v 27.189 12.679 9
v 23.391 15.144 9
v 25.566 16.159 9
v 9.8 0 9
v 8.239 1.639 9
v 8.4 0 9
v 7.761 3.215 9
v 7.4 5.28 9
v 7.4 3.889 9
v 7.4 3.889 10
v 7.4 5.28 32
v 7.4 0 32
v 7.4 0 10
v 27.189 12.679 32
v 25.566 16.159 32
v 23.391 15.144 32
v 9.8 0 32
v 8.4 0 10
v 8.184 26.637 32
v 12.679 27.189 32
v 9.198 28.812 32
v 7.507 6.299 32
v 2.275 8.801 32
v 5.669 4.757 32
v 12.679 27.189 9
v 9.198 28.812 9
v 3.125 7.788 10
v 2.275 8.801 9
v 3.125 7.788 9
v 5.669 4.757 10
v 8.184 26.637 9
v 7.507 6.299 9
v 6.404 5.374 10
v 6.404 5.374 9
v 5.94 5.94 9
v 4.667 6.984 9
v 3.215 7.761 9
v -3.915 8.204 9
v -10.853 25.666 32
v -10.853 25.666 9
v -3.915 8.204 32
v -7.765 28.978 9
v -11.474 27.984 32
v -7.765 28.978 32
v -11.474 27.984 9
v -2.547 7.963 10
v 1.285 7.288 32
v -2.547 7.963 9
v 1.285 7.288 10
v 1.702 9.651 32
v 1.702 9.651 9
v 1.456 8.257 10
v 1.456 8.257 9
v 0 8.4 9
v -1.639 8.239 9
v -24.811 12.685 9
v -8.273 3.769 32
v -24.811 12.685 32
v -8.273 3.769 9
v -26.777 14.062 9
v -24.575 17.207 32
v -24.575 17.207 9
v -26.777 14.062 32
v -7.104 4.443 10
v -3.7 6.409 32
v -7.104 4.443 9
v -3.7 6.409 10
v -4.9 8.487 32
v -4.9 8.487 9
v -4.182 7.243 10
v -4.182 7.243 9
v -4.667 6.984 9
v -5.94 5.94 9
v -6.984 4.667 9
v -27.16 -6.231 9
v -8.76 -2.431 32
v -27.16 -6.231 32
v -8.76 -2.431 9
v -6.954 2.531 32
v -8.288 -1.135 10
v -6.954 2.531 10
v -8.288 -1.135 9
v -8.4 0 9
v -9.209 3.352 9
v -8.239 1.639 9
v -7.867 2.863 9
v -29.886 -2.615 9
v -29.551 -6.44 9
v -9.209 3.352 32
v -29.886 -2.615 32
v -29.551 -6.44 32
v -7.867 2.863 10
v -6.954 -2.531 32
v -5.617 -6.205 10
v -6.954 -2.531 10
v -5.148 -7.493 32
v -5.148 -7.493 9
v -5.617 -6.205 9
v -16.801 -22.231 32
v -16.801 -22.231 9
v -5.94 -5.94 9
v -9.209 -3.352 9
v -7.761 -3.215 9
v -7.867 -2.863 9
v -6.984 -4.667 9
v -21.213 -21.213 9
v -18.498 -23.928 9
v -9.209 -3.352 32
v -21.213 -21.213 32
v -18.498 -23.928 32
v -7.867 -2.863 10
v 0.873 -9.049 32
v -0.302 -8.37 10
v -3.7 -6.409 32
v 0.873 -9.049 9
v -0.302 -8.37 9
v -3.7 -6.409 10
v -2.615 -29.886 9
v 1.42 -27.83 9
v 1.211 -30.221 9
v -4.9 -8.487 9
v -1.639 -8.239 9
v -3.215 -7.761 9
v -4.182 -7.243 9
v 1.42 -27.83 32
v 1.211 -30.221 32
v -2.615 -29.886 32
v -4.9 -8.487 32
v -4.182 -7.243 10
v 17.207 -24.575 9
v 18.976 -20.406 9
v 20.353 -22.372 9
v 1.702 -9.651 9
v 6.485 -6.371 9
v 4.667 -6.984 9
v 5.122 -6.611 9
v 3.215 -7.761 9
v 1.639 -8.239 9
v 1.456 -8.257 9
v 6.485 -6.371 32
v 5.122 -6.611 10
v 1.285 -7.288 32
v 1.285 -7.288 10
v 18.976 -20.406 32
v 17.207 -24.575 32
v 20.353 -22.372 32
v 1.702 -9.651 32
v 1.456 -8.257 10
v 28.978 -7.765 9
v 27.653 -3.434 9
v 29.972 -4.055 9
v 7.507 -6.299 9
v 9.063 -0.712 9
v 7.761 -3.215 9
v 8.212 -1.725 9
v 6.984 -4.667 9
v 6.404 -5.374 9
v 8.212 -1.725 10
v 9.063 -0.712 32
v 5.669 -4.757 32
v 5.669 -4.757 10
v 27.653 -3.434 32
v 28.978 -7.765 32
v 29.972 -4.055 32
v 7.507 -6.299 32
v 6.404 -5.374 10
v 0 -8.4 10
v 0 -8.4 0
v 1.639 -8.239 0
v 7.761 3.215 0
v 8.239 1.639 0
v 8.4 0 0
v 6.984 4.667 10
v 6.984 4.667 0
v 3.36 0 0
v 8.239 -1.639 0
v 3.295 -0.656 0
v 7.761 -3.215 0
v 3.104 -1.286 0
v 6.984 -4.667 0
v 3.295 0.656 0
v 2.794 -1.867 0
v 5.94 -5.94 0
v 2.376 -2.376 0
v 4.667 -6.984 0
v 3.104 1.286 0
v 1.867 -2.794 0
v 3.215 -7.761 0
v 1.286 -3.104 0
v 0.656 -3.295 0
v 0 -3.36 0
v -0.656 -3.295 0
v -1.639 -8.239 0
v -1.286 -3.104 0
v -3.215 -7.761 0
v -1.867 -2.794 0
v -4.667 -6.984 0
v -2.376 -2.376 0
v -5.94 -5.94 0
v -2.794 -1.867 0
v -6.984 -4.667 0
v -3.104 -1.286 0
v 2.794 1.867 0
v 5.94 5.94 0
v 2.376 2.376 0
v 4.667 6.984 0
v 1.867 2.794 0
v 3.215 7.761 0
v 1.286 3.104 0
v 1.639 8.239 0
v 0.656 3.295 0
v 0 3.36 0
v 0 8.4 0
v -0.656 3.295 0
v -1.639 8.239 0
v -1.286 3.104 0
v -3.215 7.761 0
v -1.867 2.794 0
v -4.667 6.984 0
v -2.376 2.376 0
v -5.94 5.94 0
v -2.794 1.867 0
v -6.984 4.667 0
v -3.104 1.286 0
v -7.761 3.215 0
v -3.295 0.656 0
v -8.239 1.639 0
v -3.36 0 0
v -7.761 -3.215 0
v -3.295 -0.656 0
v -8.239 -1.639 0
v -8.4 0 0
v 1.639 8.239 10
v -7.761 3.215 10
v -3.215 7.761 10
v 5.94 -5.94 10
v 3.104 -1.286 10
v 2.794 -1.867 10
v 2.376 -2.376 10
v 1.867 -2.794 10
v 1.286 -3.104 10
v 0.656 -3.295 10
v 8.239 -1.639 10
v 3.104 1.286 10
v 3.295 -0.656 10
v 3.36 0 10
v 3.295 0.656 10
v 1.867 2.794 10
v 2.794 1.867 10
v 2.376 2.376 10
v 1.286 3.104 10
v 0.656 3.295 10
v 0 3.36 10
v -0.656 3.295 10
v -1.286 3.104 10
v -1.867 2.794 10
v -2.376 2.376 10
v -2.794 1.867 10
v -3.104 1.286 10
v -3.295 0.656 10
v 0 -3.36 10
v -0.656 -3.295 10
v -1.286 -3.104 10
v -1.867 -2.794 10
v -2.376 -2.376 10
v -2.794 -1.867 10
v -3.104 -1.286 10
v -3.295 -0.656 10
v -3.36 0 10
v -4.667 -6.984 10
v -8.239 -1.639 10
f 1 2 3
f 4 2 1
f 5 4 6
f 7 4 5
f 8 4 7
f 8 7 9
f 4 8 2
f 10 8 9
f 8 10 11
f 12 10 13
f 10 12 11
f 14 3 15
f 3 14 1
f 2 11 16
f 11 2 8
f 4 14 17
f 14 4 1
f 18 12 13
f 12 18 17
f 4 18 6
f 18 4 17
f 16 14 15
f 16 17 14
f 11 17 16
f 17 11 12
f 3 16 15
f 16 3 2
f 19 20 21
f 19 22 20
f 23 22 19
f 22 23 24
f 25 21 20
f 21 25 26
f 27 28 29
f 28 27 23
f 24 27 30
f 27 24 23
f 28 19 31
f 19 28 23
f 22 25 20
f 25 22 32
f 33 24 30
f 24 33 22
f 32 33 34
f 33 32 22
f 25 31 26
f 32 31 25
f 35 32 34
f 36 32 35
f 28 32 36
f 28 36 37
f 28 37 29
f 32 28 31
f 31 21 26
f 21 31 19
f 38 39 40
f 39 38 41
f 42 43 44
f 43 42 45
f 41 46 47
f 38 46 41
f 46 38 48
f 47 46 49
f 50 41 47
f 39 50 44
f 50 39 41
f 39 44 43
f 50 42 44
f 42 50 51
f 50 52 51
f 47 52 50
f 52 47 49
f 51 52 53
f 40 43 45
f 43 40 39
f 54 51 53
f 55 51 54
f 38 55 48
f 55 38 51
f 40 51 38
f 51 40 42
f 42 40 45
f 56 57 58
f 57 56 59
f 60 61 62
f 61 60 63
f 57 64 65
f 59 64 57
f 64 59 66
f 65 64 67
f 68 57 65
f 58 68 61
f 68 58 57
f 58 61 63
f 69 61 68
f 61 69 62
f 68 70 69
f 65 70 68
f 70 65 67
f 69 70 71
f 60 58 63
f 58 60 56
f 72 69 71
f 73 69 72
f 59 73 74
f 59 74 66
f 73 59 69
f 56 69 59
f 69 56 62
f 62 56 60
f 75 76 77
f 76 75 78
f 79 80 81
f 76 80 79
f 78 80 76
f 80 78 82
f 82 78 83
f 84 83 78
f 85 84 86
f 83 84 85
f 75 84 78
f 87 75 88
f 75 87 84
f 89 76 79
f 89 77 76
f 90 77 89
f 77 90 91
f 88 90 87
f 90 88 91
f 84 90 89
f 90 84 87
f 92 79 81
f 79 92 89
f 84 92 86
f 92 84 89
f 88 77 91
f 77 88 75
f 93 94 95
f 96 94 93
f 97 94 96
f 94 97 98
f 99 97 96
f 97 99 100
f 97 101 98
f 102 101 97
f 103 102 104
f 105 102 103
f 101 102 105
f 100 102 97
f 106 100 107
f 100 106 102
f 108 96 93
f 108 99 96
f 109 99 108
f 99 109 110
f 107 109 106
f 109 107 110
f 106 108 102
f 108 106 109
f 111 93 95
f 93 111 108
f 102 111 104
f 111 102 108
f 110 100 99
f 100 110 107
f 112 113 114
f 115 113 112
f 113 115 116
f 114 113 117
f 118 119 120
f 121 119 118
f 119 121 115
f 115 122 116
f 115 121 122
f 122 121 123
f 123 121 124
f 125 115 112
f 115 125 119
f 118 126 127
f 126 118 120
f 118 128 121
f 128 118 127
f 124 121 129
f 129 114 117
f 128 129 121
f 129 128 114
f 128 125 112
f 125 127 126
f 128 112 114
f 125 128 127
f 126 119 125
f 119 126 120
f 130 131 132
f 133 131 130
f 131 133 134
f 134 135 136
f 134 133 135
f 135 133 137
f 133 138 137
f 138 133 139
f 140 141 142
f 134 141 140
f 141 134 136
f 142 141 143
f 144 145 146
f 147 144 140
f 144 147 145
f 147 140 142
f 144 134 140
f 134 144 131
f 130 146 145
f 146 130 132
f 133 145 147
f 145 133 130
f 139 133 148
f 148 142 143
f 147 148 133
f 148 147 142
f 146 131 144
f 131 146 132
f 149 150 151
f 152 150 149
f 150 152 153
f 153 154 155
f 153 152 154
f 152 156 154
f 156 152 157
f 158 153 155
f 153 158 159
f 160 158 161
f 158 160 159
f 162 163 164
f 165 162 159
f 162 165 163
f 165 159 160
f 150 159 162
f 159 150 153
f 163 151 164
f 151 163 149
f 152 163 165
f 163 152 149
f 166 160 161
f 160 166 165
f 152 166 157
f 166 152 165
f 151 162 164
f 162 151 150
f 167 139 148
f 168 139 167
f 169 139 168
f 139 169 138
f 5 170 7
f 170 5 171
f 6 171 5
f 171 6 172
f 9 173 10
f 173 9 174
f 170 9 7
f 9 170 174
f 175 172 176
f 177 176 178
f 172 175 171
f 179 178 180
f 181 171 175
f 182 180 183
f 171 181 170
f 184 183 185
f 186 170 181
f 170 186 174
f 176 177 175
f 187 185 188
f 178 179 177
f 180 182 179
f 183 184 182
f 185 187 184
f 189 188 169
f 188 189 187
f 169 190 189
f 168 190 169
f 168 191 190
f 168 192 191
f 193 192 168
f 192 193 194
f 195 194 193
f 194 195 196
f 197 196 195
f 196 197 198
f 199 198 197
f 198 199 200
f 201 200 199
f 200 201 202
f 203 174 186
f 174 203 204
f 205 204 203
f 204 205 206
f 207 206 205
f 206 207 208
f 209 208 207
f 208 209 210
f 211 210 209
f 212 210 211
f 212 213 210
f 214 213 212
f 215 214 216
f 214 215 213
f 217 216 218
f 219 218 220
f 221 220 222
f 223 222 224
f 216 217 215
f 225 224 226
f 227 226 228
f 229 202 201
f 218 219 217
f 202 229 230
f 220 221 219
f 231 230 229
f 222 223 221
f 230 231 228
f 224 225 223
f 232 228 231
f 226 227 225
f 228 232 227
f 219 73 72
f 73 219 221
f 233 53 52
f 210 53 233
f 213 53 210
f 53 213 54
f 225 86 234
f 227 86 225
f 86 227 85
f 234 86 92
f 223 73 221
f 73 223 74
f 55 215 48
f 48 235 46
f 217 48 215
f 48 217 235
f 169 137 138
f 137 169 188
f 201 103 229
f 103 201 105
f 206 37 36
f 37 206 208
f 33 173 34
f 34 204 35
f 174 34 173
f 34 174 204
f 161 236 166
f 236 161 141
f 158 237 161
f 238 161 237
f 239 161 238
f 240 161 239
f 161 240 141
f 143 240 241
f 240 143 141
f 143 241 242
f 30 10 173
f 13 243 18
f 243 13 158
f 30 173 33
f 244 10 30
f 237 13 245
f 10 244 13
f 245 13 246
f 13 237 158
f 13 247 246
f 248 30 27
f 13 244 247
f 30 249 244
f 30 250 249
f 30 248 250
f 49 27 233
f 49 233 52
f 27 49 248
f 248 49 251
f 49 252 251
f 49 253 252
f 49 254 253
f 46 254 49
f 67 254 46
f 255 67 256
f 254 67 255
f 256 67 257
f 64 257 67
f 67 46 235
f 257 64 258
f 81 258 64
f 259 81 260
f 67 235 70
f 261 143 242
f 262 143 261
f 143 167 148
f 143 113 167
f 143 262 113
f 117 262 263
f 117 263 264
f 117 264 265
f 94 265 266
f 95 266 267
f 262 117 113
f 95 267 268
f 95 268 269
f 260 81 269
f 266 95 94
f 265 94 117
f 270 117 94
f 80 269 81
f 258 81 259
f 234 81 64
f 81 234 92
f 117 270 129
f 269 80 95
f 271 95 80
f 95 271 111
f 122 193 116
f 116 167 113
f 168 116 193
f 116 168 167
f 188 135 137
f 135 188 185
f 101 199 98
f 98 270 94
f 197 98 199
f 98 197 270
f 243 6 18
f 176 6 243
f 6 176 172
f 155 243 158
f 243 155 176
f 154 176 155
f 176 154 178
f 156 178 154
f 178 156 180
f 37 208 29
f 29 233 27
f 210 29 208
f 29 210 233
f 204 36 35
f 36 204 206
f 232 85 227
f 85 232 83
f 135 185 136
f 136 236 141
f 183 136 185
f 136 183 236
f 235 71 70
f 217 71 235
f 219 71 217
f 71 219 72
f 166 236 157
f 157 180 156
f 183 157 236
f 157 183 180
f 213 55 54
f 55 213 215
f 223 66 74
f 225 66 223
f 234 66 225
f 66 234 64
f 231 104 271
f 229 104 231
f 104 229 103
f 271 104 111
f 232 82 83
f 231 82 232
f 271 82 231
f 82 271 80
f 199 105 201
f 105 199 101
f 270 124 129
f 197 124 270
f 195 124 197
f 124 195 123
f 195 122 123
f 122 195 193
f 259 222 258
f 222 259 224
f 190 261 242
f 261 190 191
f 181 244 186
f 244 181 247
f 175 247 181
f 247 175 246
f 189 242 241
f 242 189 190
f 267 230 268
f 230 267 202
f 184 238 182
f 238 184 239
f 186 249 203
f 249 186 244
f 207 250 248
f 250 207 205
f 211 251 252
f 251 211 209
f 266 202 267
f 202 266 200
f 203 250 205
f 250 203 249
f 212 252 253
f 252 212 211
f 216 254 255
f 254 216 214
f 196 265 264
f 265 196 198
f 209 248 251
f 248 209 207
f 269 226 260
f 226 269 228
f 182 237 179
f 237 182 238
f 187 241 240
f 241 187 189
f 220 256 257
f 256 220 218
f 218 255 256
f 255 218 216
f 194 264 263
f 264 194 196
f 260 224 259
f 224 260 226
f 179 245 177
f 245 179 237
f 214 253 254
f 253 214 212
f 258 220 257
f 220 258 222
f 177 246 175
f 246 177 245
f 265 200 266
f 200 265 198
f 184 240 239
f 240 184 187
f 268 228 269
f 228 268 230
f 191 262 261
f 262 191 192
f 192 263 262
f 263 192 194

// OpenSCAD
$fn = 32;

// ----------------------------------------------------------------------
// Impeller: 60 mm, 9 blades, 32 mm tall
// ----------------------------------------------------------------------

// --- parameters (mm) ---
center_d = 16.8;          // hub diameter
center_h = 10;            // hub height
wheel_d = 60;             // outer diameter over the blades
blade_count = 9;          // number of blades
blade_t = 2.4;            // blade thickness
blade_h = 22;             // blade height
blade_in_r = 7.4;         // blade root radius
blade_out_r = 27.6;       // blade tip radius
sweep = 25;               // blade sweep, degrees
bore_d = 6.72;            // shaft bore

module hub() {
  cylinder(h = center_h, d = center_d);
}

module blade() {
  /* blade swept between two boxes: hull of the root and the tip section */
  hull() {
    translate([blade_in_r, 0, center_h - 1])
      cube([blade_t, blade_t * 2.2, blade_h + 1], center = false);
    rotate([0, 0, sweep])
      translate([blade_out_r, 0, center_h - 1])
        cube([blade_t, blade_t * 1.6, blade_h + 1], center = false);
  }
}

module blades() {
  for (i = [0 : blade_count - 1])
    rotate([0, 0, i * 360 / blade_count]) blade();
}

difference() {
  union() {
    hub();
    blades();
  }
  translate([0, 0, -1]) cylinder(h = center_h + blade_h + 0 + 3, d = bore_d);
}
